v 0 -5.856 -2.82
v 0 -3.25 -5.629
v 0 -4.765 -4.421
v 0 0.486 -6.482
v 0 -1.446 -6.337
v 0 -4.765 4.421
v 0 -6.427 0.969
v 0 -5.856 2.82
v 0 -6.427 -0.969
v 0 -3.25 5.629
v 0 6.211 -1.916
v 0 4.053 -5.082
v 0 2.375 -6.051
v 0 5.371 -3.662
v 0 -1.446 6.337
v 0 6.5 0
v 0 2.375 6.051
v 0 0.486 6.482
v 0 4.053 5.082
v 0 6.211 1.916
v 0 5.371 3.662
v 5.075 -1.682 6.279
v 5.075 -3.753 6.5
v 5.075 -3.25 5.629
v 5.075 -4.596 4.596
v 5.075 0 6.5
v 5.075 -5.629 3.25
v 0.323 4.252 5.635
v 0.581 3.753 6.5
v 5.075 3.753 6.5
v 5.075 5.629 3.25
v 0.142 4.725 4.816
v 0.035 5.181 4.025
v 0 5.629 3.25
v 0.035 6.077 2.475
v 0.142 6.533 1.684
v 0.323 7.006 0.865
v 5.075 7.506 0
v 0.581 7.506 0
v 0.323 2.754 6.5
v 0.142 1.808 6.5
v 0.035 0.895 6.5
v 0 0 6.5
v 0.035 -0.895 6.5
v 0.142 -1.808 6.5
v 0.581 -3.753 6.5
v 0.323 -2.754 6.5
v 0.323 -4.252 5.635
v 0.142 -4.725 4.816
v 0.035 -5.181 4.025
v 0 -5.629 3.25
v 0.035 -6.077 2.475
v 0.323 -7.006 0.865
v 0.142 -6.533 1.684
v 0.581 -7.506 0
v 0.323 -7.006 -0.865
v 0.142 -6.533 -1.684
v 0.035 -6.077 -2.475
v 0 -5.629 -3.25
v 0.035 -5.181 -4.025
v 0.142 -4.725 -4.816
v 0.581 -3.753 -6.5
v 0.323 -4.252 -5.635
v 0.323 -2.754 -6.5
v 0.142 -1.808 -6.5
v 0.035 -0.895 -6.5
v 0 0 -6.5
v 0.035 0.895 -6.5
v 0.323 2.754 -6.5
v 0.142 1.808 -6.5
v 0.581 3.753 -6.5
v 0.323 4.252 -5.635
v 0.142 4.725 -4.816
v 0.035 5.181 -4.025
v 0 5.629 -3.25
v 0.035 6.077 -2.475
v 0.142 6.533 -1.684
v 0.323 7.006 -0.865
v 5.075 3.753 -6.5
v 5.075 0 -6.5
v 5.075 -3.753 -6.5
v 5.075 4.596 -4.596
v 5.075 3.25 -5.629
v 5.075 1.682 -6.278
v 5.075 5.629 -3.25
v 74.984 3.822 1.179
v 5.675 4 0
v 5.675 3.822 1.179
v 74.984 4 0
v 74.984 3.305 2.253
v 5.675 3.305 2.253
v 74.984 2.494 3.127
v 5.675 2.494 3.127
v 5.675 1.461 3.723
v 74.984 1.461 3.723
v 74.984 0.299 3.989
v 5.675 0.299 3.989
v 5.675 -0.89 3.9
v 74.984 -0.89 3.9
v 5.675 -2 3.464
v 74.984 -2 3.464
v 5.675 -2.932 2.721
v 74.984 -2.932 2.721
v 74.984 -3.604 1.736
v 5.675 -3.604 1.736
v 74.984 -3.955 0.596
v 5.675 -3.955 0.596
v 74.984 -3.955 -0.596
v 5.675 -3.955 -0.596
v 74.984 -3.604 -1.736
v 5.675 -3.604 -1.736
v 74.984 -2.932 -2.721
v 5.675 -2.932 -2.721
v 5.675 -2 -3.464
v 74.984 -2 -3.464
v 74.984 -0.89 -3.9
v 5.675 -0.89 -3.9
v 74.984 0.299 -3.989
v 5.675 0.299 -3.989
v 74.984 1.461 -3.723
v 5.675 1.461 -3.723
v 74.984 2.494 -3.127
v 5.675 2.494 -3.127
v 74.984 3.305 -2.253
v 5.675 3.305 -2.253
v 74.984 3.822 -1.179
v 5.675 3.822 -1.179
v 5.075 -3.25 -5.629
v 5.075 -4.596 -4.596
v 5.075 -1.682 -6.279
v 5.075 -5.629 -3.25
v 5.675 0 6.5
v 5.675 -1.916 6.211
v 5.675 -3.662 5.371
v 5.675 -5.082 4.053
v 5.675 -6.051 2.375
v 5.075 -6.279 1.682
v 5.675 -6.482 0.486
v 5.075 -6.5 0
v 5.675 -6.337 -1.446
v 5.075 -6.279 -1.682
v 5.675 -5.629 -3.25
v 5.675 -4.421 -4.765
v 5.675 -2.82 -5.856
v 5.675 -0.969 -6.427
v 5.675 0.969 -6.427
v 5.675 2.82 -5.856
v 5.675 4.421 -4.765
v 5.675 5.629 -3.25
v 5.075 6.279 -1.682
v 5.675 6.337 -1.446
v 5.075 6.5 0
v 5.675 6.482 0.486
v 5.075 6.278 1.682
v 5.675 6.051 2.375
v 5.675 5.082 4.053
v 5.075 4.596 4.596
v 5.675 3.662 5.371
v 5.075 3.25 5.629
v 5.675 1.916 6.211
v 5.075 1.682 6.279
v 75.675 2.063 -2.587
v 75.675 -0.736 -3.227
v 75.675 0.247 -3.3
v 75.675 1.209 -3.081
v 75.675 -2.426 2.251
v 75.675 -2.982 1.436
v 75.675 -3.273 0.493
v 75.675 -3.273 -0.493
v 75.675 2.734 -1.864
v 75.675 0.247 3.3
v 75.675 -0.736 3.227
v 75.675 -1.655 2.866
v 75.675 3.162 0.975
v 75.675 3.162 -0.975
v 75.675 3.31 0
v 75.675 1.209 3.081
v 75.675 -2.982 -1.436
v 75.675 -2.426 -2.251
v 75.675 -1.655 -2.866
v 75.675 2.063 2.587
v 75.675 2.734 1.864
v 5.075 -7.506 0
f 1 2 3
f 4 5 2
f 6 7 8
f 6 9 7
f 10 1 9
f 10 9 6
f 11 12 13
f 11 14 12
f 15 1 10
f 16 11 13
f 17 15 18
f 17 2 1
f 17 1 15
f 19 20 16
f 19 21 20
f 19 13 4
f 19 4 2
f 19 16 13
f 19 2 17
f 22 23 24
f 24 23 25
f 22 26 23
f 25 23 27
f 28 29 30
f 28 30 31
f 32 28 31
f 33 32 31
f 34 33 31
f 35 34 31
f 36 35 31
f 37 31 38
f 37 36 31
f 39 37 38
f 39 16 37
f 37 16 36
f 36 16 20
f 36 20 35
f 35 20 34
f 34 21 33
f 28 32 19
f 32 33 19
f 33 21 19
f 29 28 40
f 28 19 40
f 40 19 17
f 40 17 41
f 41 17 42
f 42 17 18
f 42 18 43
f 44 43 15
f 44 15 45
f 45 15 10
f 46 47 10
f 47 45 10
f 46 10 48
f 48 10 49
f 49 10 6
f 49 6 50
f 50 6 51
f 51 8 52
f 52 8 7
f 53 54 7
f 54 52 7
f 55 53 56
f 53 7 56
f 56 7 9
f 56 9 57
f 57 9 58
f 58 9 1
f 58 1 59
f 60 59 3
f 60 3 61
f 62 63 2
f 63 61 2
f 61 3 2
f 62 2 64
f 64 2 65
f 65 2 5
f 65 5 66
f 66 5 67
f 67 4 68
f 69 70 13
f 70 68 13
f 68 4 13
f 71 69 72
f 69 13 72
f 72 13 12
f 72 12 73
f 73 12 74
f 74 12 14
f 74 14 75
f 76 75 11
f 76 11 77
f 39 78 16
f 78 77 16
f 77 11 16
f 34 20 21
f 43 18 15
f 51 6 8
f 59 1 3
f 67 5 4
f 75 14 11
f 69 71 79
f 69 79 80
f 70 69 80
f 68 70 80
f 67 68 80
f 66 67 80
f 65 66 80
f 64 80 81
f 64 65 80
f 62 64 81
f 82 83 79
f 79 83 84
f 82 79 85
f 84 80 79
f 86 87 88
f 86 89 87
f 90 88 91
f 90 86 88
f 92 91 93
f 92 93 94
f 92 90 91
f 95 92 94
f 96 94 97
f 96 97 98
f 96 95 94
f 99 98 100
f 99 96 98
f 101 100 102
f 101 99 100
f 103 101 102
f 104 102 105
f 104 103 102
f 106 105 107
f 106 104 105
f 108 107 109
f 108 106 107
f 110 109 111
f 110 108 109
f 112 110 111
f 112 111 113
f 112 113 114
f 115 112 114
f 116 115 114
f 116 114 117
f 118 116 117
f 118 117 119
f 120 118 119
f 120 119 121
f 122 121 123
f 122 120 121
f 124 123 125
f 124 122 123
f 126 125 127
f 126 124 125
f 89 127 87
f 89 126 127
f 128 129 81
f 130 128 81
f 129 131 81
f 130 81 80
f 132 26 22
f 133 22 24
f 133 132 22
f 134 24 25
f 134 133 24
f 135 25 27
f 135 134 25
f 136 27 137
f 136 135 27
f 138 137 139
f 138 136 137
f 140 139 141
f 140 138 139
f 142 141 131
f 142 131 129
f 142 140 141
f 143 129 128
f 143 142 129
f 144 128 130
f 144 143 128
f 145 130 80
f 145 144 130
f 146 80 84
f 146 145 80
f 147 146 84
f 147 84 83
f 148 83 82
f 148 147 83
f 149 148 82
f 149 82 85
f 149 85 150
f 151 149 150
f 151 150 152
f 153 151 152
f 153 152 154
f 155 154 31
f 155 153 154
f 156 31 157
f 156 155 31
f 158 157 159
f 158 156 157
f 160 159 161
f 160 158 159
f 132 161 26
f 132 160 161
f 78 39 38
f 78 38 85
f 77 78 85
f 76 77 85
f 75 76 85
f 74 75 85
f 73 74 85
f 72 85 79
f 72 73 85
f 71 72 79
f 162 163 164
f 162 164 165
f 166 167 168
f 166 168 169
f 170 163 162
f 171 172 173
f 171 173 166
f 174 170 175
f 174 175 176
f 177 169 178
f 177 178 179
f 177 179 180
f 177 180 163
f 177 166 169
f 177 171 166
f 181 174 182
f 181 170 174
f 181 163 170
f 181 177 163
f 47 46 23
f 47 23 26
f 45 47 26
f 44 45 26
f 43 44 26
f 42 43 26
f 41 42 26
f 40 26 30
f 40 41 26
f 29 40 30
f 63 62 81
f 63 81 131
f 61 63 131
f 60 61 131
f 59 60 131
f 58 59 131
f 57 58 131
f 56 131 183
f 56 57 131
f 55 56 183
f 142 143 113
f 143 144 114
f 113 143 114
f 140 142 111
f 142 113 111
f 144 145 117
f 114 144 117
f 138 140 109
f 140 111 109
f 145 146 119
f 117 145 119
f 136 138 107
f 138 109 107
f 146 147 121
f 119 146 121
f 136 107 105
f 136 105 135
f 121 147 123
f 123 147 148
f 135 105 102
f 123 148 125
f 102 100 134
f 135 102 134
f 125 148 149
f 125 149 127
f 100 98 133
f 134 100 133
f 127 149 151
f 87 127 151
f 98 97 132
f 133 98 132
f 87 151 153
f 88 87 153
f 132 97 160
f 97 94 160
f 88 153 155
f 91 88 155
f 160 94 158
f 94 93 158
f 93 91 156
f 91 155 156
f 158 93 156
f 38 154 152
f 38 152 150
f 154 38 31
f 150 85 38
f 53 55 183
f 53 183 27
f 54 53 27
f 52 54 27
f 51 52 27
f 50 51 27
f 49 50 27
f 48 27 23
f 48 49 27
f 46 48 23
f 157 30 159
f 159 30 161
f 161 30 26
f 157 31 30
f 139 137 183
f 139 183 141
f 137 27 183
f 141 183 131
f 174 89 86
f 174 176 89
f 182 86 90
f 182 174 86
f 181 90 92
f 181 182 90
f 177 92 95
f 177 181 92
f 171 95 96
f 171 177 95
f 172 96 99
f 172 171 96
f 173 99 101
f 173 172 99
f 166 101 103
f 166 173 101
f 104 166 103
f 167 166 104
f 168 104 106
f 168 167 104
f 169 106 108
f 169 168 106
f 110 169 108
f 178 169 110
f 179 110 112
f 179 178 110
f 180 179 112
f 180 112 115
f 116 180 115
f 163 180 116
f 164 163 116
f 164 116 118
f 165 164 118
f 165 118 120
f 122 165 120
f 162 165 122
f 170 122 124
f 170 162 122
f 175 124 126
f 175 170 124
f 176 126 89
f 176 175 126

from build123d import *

# Parameters (mm, degrees)
BASEHEAD_DEPTH = 5.675
SKETCH4_W      = 0.6
SKETCH4_H      = 11.005553499


# Read off the part's stored shape, not the designer's step: HeadChamfer
with BuildPart() as part:
    # Sketch1 → BaseHead (new body)
    with BuildSketch(Plane(origin=(0, 0, 0), x_dir=(0, 0, -1), z_dir=(1, 0, 0))):
        Polygon((6.5, 3.75277675), (6.5, -3.75277675), (0, -7.505553499), (-6.5, -3.75277675), (-6.5, 3.75277675), (0, 7.505553499), align=None)
    extrude(amount=BASEHEAD_DEPTH)

    # HeadChamfer outline → HeadChamfer (revolve, cut)
    with BuildSketch(Plane.YX):
        Polygon((7.505553503, 0.580556586), (6.499999425, -3.32e-07), (7.505553503, -1.347e-06), align=None)
    revolve(axis=Axis((0, 0, 0), (1, 0, 0)), mode=Mode.SUBTRACT)

    # HeadChamfer 2 outline → HeadChamfer 2 (revolve)
    with BuildSketch(Plane.YX):
        Polygon((4, 5.675), (4, 74.9845), (3.3095, 75.675), (0, 75.675), (0, 5.675), align=None)
    revolve(axis=Axis((0, 0, 0), (1, 0, 0)))

    # Sketch4 → BearingFace (revolve, cut)
    with BuildSketch(Plane.XY, mode=Mode.PRIVATE) as bearingface_sk:
        with Locations((5.375, 12.00277675)):
            Rectangle(SKETCH4_W, SKETCH4_H)
    revolve(bearingface_sk.sketch.rotate(Axis((0, 0, 0), (1, 0, 0)), 90), axis=Axis((0, 0, 0), (1, 0, 0)), mode=Mode.SUBTRACT)


solid = part.part
